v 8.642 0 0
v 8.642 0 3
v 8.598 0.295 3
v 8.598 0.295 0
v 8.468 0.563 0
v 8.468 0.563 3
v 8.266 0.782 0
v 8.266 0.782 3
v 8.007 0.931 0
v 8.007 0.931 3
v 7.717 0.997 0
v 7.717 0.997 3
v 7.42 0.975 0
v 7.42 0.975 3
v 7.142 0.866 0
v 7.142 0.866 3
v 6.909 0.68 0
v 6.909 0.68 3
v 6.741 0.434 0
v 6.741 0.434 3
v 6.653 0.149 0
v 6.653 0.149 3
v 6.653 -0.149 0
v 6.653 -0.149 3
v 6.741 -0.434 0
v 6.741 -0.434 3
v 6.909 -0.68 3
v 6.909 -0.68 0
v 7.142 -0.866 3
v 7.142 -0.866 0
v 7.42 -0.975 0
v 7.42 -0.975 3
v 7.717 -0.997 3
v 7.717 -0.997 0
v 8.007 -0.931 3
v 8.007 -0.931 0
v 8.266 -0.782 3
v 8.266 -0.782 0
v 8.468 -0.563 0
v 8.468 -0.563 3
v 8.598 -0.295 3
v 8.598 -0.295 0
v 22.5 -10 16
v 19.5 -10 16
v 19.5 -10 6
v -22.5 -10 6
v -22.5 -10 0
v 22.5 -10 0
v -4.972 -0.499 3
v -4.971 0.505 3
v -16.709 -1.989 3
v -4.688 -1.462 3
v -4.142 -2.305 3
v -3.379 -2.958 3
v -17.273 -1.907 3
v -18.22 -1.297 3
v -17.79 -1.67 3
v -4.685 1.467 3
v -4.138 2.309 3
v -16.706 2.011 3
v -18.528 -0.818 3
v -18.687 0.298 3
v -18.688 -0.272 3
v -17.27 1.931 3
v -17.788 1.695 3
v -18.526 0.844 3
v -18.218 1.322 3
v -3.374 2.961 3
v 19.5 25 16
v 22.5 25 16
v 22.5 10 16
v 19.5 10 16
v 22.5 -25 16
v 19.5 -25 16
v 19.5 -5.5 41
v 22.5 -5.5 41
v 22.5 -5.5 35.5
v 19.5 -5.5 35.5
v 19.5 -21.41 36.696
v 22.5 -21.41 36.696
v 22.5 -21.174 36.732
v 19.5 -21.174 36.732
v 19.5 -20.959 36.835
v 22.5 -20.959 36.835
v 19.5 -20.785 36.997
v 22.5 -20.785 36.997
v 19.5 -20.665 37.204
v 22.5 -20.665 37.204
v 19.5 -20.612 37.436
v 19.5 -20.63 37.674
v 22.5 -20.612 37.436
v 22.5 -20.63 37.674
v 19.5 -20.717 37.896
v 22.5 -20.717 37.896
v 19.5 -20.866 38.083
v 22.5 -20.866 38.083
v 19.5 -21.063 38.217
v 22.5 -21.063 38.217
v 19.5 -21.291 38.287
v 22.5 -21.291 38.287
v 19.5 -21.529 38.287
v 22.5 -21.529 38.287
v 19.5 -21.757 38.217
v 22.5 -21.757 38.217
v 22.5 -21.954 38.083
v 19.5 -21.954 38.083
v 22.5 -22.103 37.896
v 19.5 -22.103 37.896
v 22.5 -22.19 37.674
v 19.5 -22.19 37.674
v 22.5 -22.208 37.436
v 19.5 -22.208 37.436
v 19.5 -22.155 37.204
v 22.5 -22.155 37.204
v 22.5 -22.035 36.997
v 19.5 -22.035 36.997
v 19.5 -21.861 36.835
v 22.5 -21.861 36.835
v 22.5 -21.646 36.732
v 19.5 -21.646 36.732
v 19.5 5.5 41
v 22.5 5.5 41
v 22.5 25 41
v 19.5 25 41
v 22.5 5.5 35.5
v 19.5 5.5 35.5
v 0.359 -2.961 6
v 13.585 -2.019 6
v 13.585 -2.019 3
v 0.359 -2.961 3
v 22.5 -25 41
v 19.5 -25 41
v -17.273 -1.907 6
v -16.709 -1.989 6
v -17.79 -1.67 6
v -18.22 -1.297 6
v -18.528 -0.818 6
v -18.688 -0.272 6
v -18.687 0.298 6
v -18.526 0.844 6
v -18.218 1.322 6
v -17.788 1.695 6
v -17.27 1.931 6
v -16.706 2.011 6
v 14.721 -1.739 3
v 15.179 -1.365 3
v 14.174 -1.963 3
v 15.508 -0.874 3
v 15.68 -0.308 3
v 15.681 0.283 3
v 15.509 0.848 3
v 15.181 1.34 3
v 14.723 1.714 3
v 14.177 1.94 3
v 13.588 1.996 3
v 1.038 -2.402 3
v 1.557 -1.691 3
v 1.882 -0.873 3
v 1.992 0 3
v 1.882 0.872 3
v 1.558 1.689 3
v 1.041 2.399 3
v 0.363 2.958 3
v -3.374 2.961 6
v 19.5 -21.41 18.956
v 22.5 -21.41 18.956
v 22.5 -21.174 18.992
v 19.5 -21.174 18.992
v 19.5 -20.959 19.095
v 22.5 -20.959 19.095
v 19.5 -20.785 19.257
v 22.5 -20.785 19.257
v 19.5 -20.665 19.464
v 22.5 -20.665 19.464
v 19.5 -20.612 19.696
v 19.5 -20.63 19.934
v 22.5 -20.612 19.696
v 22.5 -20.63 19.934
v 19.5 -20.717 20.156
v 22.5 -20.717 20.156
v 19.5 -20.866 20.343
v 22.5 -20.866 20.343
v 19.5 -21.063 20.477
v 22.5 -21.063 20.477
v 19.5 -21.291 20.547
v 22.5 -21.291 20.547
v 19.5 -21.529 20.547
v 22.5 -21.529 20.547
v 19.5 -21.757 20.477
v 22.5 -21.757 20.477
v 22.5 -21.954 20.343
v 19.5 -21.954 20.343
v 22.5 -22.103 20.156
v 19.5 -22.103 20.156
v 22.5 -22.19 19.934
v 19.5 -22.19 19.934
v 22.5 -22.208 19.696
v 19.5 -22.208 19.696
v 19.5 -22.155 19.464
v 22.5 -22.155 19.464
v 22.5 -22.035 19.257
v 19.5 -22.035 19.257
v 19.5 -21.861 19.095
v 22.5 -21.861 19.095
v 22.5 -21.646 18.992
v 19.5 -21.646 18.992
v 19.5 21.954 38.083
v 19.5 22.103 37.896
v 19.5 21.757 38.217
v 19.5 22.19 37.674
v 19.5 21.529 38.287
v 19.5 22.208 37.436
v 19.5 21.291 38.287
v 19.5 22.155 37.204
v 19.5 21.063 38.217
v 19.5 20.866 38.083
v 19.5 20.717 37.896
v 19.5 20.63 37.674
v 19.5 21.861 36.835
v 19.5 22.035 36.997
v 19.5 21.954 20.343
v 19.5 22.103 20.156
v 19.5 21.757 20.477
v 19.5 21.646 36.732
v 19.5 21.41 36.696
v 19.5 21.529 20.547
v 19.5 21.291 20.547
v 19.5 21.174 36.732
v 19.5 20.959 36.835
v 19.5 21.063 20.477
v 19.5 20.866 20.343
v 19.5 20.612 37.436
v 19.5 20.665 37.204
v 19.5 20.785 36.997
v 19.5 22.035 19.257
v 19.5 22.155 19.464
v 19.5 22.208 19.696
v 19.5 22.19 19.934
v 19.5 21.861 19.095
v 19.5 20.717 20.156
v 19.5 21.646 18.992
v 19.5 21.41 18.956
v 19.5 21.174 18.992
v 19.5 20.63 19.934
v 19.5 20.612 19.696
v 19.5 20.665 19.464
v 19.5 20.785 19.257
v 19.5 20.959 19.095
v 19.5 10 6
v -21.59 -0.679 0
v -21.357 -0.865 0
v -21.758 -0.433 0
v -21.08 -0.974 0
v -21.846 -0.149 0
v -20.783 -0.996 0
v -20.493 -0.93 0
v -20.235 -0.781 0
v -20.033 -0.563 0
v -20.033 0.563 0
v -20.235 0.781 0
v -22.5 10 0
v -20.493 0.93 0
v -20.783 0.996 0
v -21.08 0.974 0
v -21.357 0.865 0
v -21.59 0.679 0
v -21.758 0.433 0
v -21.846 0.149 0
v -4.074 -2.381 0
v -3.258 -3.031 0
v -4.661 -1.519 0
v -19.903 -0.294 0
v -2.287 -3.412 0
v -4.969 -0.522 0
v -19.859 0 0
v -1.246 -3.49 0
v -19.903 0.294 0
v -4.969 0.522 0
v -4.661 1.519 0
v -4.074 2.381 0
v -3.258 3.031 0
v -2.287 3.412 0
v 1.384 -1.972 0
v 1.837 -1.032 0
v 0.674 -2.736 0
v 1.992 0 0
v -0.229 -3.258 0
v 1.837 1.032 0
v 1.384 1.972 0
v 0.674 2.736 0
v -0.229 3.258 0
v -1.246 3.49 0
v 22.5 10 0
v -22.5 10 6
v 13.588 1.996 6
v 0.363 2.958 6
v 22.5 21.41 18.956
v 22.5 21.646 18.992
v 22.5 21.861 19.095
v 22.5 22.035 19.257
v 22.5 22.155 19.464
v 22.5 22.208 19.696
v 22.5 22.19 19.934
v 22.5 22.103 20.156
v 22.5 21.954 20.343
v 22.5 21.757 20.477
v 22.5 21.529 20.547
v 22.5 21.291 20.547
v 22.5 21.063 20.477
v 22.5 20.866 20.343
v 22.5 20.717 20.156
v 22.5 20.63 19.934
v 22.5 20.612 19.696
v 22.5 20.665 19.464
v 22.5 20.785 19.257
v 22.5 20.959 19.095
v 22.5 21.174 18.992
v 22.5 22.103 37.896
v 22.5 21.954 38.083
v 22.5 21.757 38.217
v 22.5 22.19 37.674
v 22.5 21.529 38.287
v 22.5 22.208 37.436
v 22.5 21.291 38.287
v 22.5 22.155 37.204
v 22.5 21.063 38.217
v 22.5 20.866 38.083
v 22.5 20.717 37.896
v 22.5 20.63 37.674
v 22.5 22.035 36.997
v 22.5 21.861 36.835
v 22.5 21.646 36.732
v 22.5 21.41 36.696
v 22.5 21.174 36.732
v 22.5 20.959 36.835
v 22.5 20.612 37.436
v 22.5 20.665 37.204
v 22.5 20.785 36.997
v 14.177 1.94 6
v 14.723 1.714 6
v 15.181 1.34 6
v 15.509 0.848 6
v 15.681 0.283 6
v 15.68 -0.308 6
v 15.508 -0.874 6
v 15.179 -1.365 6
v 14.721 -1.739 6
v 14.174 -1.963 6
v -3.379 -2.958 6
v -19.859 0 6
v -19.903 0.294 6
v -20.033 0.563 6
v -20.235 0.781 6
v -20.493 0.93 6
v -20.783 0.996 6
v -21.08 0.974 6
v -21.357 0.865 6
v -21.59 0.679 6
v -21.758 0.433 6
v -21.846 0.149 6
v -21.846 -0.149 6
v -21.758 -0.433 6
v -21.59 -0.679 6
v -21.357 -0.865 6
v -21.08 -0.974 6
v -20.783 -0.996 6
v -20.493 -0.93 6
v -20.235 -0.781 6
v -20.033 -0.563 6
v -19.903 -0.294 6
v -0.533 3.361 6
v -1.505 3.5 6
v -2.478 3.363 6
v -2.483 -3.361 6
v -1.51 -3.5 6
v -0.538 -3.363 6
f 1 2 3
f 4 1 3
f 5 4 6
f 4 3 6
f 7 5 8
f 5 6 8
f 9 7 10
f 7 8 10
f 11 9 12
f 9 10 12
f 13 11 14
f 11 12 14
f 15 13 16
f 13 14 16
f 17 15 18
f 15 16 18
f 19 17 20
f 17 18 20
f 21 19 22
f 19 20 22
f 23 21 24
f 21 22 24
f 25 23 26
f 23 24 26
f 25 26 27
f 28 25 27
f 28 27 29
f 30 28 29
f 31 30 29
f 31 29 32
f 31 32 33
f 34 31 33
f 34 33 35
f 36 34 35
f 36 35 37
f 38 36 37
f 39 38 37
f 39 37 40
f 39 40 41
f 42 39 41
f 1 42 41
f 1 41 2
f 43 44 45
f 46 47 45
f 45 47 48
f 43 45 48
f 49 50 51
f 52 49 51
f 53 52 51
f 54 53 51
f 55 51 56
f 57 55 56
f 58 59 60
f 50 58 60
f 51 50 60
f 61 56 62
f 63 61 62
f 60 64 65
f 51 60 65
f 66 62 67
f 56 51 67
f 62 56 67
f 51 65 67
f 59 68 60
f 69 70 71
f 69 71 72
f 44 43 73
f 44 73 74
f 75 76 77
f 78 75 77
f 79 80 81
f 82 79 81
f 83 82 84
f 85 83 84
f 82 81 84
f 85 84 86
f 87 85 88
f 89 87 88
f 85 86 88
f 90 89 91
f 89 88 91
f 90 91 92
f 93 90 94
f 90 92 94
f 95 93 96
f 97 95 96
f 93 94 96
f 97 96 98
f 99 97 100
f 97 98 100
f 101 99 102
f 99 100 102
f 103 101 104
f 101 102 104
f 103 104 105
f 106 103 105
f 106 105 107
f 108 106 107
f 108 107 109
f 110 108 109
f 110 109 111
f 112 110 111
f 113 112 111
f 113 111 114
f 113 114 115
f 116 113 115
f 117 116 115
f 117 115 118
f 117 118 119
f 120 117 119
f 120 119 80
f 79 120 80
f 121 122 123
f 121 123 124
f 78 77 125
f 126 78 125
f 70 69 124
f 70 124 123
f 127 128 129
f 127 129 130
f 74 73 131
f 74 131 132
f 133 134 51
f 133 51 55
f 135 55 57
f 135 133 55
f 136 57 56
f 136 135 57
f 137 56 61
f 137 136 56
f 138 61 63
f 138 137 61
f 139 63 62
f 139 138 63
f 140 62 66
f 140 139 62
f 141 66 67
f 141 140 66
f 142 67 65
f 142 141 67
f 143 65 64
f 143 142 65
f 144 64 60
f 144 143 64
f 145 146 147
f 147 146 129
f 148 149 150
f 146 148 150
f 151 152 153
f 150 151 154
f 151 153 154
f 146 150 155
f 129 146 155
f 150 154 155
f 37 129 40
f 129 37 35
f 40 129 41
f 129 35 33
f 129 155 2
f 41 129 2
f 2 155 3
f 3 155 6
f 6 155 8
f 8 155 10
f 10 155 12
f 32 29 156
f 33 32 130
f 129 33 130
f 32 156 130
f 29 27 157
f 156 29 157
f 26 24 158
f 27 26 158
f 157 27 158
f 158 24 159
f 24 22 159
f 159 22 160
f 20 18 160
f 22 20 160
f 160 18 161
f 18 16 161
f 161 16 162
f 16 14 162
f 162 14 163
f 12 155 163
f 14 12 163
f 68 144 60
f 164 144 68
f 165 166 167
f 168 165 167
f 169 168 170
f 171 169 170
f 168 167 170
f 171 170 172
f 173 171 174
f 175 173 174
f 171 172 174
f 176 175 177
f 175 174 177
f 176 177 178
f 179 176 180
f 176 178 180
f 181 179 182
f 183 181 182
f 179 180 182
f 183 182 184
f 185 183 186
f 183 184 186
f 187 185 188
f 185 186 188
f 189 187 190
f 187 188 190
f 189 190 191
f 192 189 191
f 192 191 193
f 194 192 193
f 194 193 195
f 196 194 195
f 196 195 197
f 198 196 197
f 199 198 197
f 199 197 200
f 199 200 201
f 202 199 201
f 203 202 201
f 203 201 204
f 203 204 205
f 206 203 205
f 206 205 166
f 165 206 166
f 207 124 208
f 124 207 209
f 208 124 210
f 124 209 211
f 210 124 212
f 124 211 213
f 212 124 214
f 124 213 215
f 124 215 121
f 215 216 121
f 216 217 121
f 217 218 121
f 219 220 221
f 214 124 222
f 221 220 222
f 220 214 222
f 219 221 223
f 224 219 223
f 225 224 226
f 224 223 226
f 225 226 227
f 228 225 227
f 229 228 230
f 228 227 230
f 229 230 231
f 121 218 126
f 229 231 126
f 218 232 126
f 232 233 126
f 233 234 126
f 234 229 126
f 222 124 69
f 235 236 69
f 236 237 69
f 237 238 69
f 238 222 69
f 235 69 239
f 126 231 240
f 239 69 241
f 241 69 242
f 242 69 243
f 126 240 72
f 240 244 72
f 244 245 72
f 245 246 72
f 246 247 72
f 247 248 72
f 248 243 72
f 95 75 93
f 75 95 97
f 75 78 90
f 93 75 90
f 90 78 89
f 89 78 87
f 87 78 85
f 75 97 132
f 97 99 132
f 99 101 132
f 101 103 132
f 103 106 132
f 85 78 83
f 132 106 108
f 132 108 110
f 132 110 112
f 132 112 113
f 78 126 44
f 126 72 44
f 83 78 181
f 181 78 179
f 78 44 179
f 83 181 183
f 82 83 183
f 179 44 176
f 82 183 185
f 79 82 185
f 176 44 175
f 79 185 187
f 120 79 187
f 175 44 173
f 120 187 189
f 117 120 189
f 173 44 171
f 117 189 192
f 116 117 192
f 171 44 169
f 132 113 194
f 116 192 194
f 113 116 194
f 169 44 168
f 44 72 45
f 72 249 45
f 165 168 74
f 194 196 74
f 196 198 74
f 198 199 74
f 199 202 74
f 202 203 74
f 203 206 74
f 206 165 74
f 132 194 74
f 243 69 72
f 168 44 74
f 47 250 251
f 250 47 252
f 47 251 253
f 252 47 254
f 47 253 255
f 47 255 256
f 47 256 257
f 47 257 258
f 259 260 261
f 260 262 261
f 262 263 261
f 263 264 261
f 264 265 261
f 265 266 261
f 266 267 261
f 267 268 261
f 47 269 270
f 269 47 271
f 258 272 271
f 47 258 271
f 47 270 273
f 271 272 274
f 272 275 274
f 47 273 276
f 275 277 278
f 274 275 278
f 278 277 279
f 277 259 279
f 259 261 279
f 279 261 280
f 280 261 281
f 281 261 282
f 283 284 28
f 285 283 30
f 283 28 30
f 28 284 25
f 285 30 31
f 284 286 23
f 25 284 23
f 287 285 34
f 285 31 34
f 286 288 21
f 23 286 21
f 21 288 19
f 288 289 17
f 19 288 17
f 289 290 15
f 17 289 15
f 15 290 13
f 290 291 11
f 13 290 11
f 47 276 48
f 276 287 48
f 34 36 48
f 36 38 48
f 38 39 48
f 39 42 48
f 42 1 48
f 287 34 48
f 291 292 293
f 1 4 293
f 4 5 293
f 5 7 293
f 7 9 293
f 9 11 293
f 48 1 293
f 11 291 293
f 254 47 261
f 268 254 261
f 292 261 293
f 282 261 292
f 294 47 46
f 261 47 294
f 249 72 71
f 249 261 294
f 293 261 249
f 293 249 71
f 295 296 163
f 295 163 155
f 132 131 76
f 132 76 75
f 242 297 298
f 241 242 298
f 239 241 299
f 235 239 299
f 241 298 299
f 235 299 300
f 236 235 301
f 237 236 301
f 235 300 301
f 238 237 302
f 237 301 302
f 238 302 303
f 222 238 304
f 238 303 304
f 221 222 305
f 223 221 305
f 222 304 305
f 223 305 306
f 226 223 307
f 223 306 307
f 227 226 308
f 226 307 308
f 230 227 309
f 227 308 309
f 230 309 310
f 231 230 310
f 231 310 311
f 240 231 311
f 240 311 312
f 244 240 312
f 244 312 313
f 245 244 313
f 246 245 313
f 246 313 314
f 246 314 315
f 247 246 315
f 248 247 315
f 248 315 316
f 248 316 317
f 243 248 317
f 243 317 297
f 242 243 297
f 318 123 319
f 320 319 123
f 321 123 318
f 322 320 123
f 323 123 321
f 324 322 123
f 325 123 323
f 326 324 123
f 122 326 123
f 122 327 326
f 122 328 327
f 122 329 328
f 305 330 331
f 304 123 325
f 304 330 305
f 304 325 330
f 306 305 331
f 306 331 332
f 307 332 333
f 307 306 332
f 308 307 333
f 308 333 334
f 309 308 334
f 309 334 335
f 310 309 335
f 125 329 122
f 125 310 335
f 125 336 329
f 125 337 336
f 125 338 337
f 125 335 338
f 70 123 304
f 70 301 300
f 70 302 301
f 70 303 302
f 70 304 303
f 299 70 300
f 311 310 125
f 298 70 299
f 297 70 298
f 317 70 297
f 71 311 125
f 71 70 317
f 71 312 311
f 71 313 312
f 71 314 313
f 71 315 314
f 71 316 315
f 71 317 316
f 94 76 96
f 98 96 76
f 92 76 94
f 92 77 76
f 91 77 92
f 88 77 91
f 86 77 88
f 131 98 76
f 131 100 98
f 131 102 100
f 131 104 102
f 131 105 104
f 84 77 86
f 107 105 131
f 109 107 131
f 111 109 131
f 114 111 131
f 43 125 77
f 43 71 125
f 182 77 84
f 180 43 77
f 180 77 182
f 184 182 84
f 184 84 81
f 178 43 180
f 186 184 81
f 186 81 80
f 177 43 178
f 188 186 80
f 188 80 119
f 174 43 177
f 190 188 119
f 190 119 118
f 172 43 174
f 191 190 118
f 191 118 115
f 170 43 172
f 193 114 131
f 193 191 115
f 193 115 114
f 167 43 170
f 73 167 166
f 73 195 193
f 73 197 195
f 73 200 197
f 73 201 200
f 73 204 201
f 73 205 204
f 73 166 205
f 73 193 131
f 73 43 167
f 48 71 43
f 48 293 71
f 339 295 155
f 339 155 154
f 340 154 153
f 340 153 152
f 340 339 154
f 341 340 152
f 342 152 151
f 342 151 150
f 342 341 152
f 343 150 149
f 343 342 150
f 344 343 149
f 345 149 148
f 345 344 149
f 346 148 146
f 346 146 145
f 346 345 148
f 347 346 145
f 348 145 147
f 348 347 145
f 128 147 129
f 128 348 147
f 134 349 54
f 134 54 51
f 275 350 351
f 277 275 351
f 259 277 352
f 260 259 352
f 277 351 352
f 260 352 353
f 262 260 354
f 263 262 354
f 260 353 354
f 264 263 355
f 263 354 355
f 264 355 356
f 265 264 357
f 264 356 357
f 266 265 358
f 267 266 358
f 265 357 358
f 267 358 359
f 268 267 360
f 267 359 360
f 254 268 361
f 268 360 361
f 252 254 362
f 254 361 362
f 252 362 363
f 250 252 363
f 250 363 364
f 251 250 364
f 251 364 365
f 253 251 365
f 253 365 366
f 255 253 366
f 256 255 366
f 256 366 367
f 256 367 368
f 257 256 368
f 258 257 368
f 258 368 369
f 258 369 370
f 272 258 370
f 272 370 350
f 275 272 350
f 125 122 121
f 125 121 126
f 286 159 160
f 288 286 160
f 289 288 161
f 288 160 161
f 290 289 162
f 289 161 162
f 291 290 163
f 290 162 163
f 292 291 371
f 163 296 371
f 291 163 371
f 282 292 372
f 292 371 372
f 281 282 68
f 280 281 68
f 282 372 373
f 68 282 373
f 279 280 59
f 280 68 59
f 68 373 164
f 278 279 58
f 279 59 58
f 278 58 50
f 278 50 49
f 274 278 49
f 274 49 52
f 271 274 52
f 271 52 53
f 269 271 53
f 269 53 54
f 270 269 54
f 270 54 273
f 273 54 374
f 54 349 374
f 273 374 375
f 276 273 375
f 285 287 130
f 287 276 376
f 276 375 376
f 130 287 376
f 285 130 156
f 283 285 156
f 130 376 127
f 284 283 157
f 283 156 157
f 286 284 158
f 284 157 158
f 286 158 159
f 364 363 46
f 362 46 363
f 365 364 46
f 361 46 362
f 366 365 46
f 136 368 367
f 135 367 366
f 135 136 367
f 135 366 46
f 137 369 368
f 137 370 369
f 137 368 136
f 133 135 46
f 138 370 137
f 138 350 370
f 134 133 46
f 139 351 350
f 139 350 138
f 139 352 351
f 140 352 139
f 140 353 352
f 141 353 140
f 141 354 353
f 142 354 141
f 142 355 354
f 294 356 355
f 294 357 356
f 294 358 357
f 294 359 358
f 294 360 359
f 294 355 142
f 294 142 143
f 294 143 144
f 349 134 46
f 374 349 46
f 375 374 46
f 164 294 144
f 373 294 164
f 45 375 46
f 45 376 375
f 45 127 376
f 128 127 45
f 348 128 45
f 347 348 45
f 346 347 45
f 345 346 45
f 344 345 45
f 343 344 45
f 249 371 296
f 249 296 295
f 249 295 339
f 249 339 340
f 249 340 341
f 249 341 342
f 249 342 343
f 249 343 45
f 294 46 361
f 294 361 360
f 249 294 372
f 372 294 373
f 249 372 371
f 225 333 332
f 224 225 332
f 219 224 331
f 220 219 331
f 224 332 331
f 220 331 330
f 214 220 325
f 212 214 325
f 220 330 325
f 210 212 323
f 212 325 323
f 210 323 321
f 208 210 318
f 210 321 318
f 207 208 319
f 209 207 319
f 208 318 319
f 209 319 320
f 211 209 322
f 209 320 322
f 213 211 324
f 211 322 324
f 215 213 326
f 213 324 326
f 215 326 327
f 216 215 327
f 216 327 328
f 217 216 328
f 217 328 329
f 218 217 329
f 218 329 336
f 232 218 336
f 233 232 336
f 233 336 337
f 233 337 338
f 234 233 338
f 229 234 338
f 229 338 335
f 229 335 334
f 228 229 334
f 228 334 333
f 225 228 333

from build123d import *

# Parameters (mm, degrees)
CROQUIS1_W              = 45
CROQUIS1_H              = 20
SALIENTE_EXTRUIR1_DEPTH = 6
CROQUIS2_W              = 3
CROQUIS2_H              = 20
SALIENTE_EXTRUIR2_DEPTH = 10
SALIENTE_EXTRUIR3_DEPTH = 25
CROQUIS4_R              = 0.8
CROQUIS4_W              = 11
CROQUIS4_H              = 11
CORTAR_EXTRUIR1_DEPTH   = 66.810333535
CROQUIS5_R              = 0.998921469
CROQUIS5_R_2            = 1
CORTAR_EXTRUIR2_DEPTH   = 49.541219597
CORTAR_EXTRUIR3_DEPTH   = 3
CROQUIS7_R              = 3.5
CORTAR_EXTRUIR4_DEPTH   = 49.541219597


with BuildPart() as part:
    # Croquis1 → Saliente-Extruir1 (new body)
    with BuildSketch(Plane.XY):
        Rectangle(CROQUIS1_W, CROQUIS1_H)
    extrude(amount=SALIENTE_EXTRUIR1_DEPTH)

    # Croquis2 → Saliente-Extruir2 (add)
    with BuildSketch(Plane.XY.offset(6)):
        with Locations((21, 0)):
            Rectangle(CROQUIS2_W, CROQUIS2_H)
    extrude(amount=SALIENTE_EXTRUIR2_DEPTH)

    # Croquis3 → Saliente-Extruir3 (add)
    with BuildSketch(Plane.XY.offset(16)):
        Polygon((19.5, 0), (19.5, 25), (22.5, 25), (22.5, -25), (19.5, -25), align=None)
    extrude(amount=SALIENTE_EXTRUIR3_DEPTH)

    # Croquis4 → Cortar-Extruir1 (cut, through all)
    with BuildSketch(Plane(origin=(22.5, 0, 0), x_dir=(0, 0, -1), z_dir=(1, 0, 0))):
        with Locations((-19.756259271, -21.41)):
            Circle(CROQUIS4_R)
        with Locations((-37.496259271, -21.41)):
            Circle(CROQUIS4_R)
        with Locations((-19.756259271, 21.41)):
            Circle(CROQUIS4_R)
        with Locations((-37.496259271, 21.41)):
            Circle(CROQUIS4_R)
        with Locations((-41, 0)):
            Rectangle(CROQUIS4_W, CROQUIS4_H)
    extrude(amount=-CORTAR_EXTRUIR1_DEPTH, mode=Mode.SUBTRACT)

    # Croquis5 → Cortar-Extruir2 (cut, through all)
    with BuildSketch(Plane.XY.offset(6)):
        with Locations((-20.857855881, 0)):
            Circle(CROQUIS5_R)
        with Locations((7.642144119, 0)):
            Circle(CROQUIS5_R_2)
    extrude(amount=-CORTAR_EXTRUIR2_DEPTH, mode=Mode.SUBTRACT)

    # Croquis6 → Cortar-Extruir3 (cut)
    with BuildSketch(Plane.XY.offset(6)):
        with BuildLine():
            Line((-16.706350445, 2.011408213), (-3.374218766, 2.960859602))
            Line((-3.374218766, 2.960859602), (0.362949608, 2.958054567))
            Line((0.362949608, 2.958054567), (13.588372541, 1.996246225))
            ThreePointArc((13.588372541, 1.996246225), (15.702474132, -0.012917688), (13.585358857, -2.018905744))
            Line((13.585358857, -2.018905744), (0.358507003, -2.960859602))
            Line((0.358507003, -2.960859602), (-3.37866137, -2.958054567))
            Line((-3.37866137, -2.958054567), (-16.709352754, -1.988590661))
            ThreePointArc((-16.709352754, -1.988590661), (-18.707851036, 0.012909931), (-16.706350445, 2.011408213))
        make_face()
    extrude(amount=-CORTAR_EXTRUIR3_DEPTH, mode=Mode.SUBTRACT)

    # Croquis7 → Cortar-Extruir4 (cut, through all)
    with BuildSketch(Plane.XY.offset(6)):
        with Locations((-1.507855881, 0)):
            Circle(CROQUIS7_R)
    extrude(amount=-CORTAR_EXTRUIR4_DEPTH, mode=Mode.SUBTRACT)


solid = part.part
